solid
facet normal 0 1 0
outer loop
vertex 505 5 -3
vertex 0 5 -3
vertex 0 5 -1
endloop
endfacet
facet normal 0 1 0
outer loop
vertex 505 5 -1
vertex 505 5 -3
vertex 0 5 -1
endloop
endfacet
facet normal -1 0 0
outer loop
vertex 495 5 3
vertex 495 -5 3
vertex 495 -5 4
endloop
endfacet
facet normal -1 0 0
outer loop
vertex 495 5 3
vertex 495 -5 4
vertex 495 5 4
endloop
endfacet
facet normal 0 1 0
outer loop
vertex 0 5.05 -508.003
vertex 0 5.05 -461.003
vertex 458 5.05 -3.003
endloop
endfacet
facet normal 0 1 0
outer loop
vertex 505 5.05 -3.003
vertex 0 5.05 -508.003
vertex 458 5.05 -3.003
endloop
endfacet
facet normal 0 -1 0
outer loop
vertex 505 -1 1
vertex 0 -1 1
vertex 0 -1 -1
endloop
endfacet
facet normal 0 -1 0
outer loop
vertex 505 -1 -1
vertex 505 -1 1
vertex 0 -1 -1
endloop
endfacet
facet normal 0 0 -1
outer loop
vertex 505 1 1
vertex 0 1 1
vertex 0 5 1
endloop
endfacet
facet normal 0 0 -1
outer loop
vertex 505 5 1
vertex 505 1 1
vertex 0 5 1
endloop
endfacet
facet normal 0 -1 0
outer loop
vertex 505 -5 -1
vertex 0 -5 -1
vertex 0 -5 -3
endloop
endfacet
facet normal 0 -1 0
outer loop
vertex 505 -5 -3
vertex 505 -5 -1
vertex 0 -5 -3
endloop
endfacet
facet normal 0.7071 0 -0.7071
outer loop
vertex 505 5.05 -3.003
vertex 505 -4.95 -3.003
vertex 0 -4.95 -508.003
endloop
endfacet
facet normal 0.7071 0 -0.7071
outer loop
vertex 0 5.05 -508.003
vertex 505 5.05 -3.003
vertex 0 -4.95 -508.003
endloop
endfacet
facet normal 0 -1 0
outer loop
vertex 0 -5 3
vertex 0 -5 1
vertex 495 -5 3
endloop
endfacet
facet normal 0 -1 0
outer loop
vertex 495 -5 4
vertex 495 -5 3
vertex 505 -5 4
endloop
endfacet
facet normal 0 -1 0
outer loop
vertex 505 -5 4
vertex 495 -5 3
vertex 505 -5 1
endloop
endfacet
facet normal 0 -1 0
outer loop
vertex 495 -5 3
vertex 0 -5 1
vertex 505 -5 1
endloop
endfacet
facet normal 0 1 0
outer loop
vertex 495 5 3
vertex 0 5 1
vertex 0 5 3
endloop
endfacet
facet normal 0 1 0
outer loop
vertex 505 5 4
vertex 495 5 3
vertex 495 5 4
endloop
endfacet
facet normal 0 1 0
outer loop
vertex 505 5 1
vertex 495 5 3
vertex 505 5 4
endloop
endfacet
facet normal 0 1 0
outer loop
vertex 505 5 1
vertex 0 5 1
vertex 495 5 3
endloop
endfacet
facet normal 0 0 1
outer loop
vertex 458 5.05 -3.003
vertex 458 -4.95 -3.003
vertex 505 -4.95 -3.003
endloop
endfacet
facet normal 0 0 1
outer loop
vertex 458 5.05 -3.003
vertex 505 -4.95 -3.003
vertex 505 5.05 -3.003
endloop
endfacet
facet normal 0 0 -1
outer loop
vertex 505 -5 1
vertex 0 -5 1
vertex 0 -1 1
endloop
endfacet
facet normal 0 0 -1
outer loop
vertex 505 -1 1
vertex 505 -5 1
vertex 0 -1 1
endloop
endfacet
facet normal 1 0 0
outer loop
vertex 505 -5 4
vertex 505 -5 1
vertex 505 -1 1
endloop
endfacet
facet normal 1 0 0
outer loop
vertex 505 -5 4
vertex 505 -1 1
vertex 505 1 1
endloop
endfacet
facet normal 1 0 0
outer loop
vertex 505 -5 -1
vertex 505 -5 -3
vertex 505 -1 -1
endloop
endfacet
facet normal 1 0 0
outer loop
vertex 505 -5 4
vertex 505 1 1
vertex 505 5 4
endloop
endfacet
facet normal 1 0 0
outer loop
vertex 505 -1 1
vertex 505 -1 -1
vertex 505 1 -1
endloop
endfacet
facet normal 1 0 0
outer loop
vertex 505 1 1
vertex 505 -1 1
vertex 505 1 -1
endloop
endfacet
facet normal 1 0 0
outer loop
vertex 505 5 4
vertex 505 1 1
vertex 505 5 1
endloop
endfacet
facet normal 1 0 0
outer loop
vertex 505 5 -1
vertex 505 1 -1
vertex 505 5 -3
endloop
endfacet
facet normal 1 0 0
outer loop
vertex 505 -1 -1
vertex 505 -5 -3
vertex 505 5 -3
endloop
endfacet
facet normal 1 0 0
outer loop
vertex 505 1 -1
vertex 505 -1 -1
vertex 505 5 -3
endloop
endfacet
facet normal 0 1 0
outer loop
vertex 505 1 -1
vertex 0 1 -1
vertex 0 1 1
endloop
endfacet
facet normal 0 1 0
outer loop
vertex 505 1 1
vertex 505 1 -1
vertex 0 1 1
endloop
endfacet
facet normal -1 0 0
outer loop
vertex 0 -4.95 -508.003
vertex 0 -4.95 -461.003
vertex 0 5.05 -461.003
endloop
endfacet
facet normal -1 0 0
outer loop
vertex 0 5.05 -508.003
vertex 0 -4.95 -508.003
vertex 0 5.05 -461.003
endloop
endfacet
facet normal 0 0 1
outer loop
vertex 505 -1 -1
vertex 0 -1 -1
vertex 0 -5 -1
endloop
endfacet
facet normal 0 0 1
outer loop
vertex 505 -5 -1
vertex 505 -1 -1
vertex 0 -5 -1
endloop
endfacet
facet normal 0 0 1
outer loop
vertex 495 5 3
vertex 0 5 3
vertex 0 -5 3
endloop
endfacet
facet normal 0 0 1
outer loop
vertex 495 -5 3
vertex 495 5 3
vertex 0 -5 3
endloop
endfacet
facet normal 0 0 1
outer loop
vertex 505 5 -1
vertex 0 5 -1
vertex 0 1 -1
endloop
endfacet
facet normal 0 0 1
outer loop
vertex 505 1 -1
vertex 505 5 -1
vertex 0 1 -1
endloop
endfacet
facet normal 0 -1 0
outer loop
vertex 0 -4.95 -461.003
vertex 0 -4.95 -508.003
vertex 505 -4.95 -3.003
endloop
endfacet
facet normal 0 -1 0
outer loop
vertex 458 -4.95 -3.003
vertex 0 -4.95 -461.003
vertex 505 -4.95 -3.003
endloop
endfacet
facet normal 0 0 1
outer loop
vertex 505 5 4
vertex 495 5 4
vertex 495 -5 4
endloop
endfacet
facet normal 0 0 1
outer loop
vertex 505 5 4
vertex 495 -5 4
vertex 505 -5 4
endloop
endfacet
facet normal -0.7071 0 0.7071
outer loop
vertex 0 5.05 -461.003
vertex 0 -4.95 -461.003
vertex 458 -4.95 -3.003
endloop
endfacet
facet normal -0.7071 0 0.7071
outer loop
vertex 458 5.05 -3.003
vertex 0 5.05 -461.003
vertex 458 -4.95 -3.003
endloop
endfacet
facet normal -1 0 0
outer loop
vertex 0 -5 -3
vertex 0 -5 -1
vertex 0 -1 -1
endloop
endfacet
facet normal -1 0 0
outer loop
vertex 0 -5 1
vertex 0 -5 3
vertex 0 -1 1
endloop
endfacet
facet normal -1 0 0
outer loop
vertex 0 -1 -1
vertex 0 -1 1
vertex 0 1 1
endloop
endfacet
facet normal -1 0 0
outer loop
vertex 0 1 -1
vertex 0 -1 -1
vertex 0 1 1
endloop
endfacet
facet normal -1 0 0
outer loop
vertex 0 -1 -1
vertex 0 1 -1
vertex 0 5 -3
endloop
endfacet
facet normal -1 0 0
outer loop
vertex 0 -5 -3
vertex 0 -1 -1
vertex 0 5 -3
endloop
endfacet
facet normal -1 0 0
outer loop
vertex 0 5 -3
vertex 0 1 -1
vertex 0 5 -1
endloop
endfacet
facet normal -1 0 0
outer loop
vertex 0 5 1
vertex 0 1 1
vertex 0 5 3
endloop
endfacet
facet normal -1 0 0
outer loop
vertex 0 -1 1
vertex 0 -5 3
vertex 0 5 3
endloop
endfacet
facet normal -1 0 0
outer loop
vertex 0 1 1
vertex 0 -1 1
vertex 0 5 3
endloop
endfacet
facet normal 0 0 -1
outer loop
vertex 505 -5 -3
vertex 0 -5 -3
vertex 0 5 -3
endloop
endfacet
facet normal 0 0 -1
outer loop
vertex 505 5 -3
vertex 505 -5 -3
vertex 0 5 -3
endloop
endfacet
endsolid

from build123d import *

# Parameters (mm, degrees)
F1_DEPTH = 505
F2_W     = 10
F2_H     = 10
F3_DEPTH = 1
F4_W     = 10
F4_H     = 505
F5_DEPTH = 505
F7_DEPTH = 10.001
F9_DEPTH = 10.001


with BuildPart() as f1:
    # F0 (on Right) → F1 (new body)
    with BuildSketch(Plane.YZ):
        Polygon((-1, 1), (-1, 0), (-1, -1), (-5, -1), (-5, -3), (0, -3), (5, -3), (5, -1), (1, -1), (1, 0), (1, 1), (5, 1), (5, 3), (0, 3), (-5, 3), (-5, 1), align=None)
    extrude(amount=F1_DEPTH)

    # F2 (on face) → F3 (join)
    with BuildSketch(Plane.XY.offset(3)):
        with Locations((500, 0)):
            Rectangle(F2_W, F2_H)
    extrude(amount=F3_DEPTH)


with BuildPart() as f5:
    # F4 (on Right) → F5 (new body)
    with BuildSketch(Plane.YZ):
        with Locations((0.050011, -255.503209)):
            Rectangle(F4_W, F4_H)
    extrude(amount=F5_DEPTH)

    # F6 (on face) → F7 (cut, through all)
    with BuildSketch(Plane.XZ.offset(4.949989)):
        Polygon((458, -3.003209), (0, -3.003209), (0, -461.003209), align=None)
    extrude(amount=-F7_DEPTH, mode=Mode.SUBTRACT)

    # F8 (on face) → F9 (cut, through all)
    with BuildSketch(Plane.XZ.offset(4.949989)):
        Polygon((505, -3.003209), (0, -508.003209), (505, -508.003209), align=None)
    extrude(amount=-F9_DEPTH, mode=Mode.SUBTRACT)


solid = Compound([f1.part, f5.part])
